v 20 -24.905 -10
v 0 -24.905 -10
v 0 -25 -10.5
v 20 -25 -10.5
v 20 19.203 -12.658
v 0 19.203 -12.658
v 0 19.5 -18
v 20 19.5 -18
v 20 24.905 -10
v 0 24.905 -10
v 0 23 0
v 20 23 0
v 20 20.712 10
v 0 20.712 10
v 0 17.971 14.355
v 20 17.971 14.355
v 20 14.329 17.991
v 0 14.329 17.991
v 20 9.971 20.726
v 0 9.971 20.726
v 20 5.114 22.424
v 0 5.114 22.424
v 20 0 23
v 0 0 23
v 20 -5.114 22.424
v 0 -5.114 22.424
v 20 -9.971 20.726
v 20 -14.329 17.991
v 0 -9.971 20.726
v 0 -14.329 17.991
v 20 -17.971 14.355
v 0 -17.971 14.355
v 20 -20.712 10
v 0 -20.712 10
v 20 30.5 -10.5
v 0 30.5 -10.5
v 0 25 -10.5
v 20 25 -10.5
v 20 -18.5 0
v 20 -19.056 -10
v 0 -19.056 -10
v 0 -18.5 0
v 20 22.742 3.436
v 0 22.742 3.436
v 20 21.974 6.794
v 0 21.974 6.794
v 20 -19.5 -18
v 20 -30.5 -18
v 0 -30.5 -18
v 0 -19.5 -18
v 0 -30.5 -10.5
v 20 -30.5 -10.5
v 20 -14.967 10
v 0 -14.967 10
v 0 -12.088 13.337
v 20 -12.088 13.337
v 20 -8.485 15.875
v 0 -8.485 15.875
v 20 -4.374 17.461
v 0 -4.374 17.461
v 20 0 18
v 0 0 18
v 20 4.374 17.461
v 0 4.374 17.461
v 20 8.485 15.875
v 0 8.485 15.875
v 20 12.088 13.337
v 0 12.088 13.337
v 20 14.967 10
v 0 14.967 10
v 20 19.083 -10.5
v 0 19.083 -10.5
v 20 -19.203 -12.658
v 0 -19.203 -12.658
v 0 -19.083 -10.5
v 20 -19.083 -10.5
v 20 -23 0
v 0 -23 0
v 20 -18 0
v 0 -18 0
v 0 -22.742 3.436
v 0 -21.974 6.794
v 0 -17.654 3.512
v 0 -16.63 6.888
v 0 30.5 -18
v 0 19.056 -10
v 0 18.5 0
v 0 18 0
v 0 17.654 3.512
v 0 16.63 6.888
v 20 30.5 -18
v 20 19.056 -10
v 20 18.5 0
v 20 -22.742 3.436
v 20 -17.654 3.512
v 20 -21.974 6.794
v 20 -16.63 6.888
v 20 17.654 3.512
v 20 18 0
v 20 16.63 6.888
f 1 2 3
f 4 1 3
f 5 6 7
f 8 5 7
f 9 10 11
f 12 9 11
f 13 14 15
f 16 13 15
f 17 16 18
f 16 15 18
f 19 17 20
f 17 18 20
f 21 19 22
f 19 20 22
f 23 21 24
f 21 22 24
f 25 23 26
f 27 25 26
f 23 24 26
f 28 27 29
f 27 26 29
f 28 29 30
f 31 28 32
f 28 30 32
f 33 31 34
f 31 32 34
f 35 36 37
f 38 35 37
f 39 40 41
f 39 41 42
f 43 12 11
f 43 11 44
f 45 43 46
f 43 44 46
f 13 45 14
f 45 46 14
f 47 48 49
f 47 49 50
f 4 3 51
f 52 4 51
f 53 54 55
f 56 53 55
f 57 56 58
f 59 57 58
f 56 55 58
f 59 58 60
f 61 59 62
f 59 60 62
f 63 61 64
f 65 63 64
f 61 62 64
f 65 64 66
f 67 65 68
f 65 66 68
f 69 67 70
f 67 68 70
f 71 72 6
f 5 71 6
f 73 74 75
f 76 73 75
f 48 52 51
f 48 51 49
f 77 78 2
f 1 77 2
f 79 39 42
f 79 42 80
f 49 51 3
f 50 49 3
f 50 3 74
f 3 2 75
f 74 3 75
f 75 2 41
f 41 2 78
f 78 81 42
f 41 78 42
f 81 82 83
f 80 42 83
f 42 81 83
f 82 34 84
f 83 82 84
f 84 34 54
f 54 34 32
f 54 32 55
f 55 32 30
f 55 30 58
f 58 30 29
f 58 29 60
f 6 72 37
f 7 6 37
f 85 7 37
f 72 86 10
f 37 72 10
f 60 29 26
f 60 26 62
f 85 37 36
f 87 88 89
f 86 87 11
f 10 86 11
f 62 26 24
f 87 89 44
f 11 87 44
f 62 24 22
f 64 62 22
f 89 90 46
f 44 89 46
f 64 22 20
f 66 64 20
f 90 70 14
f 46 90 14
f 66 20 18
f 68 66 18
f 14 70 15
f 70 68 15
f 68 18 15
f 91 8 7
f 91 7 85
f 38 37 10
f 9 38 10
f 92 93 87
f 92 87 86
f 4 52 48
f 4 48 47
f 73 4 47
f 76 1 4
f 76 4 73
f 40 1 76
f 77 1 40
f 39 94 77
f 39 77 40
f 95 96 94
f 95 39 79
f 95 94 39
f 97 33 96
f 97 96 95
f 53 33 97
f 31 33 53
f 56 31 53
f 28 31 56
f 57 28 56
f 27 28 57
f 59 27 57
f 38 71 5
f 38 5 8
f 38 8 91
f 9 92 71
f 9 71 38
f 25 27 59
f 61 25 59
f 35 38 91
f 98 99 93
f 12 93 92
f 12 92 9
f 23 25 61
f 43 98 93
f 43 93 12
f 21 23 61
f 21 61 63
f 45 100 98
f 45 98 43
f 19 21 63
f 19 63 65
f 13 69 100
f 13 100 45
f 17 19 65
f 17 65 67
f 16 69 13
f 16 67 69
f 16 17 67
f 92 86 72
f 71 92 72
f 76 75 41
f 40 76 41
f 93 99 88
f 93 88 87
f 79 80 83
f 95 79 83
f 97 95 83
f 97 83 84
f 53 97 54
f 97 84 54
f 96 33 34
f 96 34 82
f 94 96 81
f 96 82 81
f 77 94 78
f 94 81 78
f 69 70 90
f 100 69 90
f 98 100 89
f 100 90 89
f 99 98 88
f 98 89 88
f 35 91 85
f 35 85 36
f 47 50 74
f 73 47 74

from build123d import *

# Parameters (mm, degrees)
F1_DEPTH = 20


with BuildPart() as f1:
    # F0 (on Right) → F1 (new body)
    with BuildSketch(Plane.YZ):
        with BuildLine():
            ThreePointArc((14.9666295471, 10), (17.2249721603, 5.2249721603), (18, 0))
            Line((18, 0), (18.5, 0))
            Line((18.5, 0), (23, 0))
            ThreePointArc((23, 0), (22.4207855469, 5.1291690811), (20.7123151772, 10))
            Line((20.7123151772, 10), (14.9666295471, 10))
        make_face()
        with BuildLine():
            ThreePointArc((-14.9666295471, 10), (0, 18), (14.9666295471, 10))
            Line((14.9666295471, 10), (20.7123151772, 10))
            ThreePointArc((20.7123151772, 10), (0, 23), (-20.7123151772, 10))
            Line((-20.7123151772, 10), (-14.9666295471, 10))
        make_face()
        with BuildLine():
            Line((23, 0), (18.5, 0))
            Line((18.5, 0), (19.0555555556, -10))
            Line((19.0555555556, -10), (20.7123151772, -10))
            ThreePointArc((20.7123151772, -10), (22.4207855469, -5.1291690811), (23, 0))
        make_face()
        with BuildLine():
            ThreePointArc((-18, 0), (-17.2249721603, 5.2249721603), (-14.9666295471, 10))
            Line((-14.9666295471, 10), (-20.7123151772, 10))
            ThreePointArc((-20.7123151772, 10), (-22.4207855469, 5.1291690811), (-23, 0))
            Line((-23, 0), (-18.5, 0))
            Line((-18.5, 0), (-18, 0))
        make_face()
        with BuildLine():
            Line((23, -10), (23, 0))
            ThreePointArc((23, 0), (22.4207855469, -5.1291690811), (20.7123151772, -10))
            Line((20.7123151772, -10), (23, -10))
        make_face()
        Polygon((24.9047619048, -10), (23, 0), (23, -10), align=None)
        with BuildLine():
            Line((20.7123151772, -10), (19.0555555556, -10))
            Line((19.0555555556, -10), (19.0833333333, -10.5))
            Line((19.0833333333, -10.5), (20.4633819297, -10.5))
            ThreePointArc((20.4633819297, -10.5), (20.5893663831, -10.2507556766), (20.7123151772, -10))
        make_face()
        with BuildLine():
            Line((-19.0555555556, -10), (-18.5, 0))
            Line((-18.5, 0), (-23, 0))
            ThreePointArc((-23, 0), (-22.4207855469, -5.1291690811), (-20.7123151772, -10))
            Line((-20.7123151772, -10), (-19.0555555556, -10))
        make_face()
        with BuildLine():
            Line((23, -10), (20.7123151772, -10))
            ThreePointArc((20.7123151772, -10), (20.5893663831, -10.2507556766), (20.4633819297, -10.5))
            Line((20.4633819297, -10.5), (23, -10.5))
            Line((23, -10.5), (23, -10))
        make_face()
        Polygon((24.9047619048, -10), (23, -10), (23, -10.5), (25, -10.5), align=None)
        with BuildLine():
            Line((20.4633819297, -10.5), (19.0833333333, -10.5))
            Line((19.0833333333, -10.5), (19.2032450764, -12.6584113749))
            ThreePointArc((19.2032450764, -12.6584113749), (19.862653635, -11.5963352217), (20.4633819297, -10.5))
        make_face()
        with BuildLine():
            ThreePointArc((-20.7123151772, -10), (-22.4207855469, -5.1291690811), (-23, 0))
            Line((-23, 0), (-24.9047619048, -10))
            Line((-24.9047619048, -10), (-20.7123151772, -10))
        make_face()
        with BuildLine():
            Line((-19.0833333333, -10.5), (-19.0555555556, -10))
            Line((-19.0555555556, -10), (-20.7123151772, -10))
            ThreePointArc((-20.7123151772, -10), (-20.5893663831, -10.2507556766), (-20.4633819297, -10.5))
            Line((-20.4633819297, -10.5), (-19.0833333333, -10.5))
        make_face()
        with BuildLine():
            Line((-19.5, -18), (-19.2032450764, -12.6584113749))
            ThreePointArc((-19.2032450764, -12.6584113749), (-19.862653635, -11.5963352217), (-20.4633819297, -10.5))
            Line((-20.4633819297, -10.5), (-25, -10.5))
            Line((-25, -10.5), (-30.5, -10.5))
            Line((-30.5, -10.5), (-30.5, -18))
            Line((-30.5, -18), (-19.5, -18))
        make_face()
        with BuildLine():
            ThreePointArc((-20.4633819297, -10.5), (-19.862653635, -11.5963352217), (-19.2032450764, -12.6584113749))
            Line((-19.2032450764, -12.6584113749), (-19.0833333333, -10.5))
            Line((-19.0833333333, -10.5), (-20.4633819297, -10.5))
        make_face()
        with BuildLine():
            Line((23, -10.5), (20.4633819297, -10.5))
            ThreePointArc((20.4633819297, -10.5), (19.862653635, -11.5963352217), (19.2032450764, -12.6584113749))
            Line((19.2032450764, -12.6584113749), (19.5, -18))
            Line((19.5, -18), (30.5, -18))
            Line((30.5, -18), (30.5, -10.5))
            Line((30.5, -10.5), (25, -10.5))
            Line((25, -10.5), (23, -10.5))
        make_face()
        with BuildLine():
            ThreePointArc((-20.4633819297, -10.5), (-20.5893663831, -10.2507556766), (-20.7123151772, -10))
            Line((-20.7123151772, -10), (-24.9047619048, -10))
            Line((-24.9047619048, -10), (-25, -10.5))
            Line((-25, -10.5), (-20.4633819297, -10.5))
        make_face()
    extrude(amount=F1_DEPTH)


solid = f1.part
